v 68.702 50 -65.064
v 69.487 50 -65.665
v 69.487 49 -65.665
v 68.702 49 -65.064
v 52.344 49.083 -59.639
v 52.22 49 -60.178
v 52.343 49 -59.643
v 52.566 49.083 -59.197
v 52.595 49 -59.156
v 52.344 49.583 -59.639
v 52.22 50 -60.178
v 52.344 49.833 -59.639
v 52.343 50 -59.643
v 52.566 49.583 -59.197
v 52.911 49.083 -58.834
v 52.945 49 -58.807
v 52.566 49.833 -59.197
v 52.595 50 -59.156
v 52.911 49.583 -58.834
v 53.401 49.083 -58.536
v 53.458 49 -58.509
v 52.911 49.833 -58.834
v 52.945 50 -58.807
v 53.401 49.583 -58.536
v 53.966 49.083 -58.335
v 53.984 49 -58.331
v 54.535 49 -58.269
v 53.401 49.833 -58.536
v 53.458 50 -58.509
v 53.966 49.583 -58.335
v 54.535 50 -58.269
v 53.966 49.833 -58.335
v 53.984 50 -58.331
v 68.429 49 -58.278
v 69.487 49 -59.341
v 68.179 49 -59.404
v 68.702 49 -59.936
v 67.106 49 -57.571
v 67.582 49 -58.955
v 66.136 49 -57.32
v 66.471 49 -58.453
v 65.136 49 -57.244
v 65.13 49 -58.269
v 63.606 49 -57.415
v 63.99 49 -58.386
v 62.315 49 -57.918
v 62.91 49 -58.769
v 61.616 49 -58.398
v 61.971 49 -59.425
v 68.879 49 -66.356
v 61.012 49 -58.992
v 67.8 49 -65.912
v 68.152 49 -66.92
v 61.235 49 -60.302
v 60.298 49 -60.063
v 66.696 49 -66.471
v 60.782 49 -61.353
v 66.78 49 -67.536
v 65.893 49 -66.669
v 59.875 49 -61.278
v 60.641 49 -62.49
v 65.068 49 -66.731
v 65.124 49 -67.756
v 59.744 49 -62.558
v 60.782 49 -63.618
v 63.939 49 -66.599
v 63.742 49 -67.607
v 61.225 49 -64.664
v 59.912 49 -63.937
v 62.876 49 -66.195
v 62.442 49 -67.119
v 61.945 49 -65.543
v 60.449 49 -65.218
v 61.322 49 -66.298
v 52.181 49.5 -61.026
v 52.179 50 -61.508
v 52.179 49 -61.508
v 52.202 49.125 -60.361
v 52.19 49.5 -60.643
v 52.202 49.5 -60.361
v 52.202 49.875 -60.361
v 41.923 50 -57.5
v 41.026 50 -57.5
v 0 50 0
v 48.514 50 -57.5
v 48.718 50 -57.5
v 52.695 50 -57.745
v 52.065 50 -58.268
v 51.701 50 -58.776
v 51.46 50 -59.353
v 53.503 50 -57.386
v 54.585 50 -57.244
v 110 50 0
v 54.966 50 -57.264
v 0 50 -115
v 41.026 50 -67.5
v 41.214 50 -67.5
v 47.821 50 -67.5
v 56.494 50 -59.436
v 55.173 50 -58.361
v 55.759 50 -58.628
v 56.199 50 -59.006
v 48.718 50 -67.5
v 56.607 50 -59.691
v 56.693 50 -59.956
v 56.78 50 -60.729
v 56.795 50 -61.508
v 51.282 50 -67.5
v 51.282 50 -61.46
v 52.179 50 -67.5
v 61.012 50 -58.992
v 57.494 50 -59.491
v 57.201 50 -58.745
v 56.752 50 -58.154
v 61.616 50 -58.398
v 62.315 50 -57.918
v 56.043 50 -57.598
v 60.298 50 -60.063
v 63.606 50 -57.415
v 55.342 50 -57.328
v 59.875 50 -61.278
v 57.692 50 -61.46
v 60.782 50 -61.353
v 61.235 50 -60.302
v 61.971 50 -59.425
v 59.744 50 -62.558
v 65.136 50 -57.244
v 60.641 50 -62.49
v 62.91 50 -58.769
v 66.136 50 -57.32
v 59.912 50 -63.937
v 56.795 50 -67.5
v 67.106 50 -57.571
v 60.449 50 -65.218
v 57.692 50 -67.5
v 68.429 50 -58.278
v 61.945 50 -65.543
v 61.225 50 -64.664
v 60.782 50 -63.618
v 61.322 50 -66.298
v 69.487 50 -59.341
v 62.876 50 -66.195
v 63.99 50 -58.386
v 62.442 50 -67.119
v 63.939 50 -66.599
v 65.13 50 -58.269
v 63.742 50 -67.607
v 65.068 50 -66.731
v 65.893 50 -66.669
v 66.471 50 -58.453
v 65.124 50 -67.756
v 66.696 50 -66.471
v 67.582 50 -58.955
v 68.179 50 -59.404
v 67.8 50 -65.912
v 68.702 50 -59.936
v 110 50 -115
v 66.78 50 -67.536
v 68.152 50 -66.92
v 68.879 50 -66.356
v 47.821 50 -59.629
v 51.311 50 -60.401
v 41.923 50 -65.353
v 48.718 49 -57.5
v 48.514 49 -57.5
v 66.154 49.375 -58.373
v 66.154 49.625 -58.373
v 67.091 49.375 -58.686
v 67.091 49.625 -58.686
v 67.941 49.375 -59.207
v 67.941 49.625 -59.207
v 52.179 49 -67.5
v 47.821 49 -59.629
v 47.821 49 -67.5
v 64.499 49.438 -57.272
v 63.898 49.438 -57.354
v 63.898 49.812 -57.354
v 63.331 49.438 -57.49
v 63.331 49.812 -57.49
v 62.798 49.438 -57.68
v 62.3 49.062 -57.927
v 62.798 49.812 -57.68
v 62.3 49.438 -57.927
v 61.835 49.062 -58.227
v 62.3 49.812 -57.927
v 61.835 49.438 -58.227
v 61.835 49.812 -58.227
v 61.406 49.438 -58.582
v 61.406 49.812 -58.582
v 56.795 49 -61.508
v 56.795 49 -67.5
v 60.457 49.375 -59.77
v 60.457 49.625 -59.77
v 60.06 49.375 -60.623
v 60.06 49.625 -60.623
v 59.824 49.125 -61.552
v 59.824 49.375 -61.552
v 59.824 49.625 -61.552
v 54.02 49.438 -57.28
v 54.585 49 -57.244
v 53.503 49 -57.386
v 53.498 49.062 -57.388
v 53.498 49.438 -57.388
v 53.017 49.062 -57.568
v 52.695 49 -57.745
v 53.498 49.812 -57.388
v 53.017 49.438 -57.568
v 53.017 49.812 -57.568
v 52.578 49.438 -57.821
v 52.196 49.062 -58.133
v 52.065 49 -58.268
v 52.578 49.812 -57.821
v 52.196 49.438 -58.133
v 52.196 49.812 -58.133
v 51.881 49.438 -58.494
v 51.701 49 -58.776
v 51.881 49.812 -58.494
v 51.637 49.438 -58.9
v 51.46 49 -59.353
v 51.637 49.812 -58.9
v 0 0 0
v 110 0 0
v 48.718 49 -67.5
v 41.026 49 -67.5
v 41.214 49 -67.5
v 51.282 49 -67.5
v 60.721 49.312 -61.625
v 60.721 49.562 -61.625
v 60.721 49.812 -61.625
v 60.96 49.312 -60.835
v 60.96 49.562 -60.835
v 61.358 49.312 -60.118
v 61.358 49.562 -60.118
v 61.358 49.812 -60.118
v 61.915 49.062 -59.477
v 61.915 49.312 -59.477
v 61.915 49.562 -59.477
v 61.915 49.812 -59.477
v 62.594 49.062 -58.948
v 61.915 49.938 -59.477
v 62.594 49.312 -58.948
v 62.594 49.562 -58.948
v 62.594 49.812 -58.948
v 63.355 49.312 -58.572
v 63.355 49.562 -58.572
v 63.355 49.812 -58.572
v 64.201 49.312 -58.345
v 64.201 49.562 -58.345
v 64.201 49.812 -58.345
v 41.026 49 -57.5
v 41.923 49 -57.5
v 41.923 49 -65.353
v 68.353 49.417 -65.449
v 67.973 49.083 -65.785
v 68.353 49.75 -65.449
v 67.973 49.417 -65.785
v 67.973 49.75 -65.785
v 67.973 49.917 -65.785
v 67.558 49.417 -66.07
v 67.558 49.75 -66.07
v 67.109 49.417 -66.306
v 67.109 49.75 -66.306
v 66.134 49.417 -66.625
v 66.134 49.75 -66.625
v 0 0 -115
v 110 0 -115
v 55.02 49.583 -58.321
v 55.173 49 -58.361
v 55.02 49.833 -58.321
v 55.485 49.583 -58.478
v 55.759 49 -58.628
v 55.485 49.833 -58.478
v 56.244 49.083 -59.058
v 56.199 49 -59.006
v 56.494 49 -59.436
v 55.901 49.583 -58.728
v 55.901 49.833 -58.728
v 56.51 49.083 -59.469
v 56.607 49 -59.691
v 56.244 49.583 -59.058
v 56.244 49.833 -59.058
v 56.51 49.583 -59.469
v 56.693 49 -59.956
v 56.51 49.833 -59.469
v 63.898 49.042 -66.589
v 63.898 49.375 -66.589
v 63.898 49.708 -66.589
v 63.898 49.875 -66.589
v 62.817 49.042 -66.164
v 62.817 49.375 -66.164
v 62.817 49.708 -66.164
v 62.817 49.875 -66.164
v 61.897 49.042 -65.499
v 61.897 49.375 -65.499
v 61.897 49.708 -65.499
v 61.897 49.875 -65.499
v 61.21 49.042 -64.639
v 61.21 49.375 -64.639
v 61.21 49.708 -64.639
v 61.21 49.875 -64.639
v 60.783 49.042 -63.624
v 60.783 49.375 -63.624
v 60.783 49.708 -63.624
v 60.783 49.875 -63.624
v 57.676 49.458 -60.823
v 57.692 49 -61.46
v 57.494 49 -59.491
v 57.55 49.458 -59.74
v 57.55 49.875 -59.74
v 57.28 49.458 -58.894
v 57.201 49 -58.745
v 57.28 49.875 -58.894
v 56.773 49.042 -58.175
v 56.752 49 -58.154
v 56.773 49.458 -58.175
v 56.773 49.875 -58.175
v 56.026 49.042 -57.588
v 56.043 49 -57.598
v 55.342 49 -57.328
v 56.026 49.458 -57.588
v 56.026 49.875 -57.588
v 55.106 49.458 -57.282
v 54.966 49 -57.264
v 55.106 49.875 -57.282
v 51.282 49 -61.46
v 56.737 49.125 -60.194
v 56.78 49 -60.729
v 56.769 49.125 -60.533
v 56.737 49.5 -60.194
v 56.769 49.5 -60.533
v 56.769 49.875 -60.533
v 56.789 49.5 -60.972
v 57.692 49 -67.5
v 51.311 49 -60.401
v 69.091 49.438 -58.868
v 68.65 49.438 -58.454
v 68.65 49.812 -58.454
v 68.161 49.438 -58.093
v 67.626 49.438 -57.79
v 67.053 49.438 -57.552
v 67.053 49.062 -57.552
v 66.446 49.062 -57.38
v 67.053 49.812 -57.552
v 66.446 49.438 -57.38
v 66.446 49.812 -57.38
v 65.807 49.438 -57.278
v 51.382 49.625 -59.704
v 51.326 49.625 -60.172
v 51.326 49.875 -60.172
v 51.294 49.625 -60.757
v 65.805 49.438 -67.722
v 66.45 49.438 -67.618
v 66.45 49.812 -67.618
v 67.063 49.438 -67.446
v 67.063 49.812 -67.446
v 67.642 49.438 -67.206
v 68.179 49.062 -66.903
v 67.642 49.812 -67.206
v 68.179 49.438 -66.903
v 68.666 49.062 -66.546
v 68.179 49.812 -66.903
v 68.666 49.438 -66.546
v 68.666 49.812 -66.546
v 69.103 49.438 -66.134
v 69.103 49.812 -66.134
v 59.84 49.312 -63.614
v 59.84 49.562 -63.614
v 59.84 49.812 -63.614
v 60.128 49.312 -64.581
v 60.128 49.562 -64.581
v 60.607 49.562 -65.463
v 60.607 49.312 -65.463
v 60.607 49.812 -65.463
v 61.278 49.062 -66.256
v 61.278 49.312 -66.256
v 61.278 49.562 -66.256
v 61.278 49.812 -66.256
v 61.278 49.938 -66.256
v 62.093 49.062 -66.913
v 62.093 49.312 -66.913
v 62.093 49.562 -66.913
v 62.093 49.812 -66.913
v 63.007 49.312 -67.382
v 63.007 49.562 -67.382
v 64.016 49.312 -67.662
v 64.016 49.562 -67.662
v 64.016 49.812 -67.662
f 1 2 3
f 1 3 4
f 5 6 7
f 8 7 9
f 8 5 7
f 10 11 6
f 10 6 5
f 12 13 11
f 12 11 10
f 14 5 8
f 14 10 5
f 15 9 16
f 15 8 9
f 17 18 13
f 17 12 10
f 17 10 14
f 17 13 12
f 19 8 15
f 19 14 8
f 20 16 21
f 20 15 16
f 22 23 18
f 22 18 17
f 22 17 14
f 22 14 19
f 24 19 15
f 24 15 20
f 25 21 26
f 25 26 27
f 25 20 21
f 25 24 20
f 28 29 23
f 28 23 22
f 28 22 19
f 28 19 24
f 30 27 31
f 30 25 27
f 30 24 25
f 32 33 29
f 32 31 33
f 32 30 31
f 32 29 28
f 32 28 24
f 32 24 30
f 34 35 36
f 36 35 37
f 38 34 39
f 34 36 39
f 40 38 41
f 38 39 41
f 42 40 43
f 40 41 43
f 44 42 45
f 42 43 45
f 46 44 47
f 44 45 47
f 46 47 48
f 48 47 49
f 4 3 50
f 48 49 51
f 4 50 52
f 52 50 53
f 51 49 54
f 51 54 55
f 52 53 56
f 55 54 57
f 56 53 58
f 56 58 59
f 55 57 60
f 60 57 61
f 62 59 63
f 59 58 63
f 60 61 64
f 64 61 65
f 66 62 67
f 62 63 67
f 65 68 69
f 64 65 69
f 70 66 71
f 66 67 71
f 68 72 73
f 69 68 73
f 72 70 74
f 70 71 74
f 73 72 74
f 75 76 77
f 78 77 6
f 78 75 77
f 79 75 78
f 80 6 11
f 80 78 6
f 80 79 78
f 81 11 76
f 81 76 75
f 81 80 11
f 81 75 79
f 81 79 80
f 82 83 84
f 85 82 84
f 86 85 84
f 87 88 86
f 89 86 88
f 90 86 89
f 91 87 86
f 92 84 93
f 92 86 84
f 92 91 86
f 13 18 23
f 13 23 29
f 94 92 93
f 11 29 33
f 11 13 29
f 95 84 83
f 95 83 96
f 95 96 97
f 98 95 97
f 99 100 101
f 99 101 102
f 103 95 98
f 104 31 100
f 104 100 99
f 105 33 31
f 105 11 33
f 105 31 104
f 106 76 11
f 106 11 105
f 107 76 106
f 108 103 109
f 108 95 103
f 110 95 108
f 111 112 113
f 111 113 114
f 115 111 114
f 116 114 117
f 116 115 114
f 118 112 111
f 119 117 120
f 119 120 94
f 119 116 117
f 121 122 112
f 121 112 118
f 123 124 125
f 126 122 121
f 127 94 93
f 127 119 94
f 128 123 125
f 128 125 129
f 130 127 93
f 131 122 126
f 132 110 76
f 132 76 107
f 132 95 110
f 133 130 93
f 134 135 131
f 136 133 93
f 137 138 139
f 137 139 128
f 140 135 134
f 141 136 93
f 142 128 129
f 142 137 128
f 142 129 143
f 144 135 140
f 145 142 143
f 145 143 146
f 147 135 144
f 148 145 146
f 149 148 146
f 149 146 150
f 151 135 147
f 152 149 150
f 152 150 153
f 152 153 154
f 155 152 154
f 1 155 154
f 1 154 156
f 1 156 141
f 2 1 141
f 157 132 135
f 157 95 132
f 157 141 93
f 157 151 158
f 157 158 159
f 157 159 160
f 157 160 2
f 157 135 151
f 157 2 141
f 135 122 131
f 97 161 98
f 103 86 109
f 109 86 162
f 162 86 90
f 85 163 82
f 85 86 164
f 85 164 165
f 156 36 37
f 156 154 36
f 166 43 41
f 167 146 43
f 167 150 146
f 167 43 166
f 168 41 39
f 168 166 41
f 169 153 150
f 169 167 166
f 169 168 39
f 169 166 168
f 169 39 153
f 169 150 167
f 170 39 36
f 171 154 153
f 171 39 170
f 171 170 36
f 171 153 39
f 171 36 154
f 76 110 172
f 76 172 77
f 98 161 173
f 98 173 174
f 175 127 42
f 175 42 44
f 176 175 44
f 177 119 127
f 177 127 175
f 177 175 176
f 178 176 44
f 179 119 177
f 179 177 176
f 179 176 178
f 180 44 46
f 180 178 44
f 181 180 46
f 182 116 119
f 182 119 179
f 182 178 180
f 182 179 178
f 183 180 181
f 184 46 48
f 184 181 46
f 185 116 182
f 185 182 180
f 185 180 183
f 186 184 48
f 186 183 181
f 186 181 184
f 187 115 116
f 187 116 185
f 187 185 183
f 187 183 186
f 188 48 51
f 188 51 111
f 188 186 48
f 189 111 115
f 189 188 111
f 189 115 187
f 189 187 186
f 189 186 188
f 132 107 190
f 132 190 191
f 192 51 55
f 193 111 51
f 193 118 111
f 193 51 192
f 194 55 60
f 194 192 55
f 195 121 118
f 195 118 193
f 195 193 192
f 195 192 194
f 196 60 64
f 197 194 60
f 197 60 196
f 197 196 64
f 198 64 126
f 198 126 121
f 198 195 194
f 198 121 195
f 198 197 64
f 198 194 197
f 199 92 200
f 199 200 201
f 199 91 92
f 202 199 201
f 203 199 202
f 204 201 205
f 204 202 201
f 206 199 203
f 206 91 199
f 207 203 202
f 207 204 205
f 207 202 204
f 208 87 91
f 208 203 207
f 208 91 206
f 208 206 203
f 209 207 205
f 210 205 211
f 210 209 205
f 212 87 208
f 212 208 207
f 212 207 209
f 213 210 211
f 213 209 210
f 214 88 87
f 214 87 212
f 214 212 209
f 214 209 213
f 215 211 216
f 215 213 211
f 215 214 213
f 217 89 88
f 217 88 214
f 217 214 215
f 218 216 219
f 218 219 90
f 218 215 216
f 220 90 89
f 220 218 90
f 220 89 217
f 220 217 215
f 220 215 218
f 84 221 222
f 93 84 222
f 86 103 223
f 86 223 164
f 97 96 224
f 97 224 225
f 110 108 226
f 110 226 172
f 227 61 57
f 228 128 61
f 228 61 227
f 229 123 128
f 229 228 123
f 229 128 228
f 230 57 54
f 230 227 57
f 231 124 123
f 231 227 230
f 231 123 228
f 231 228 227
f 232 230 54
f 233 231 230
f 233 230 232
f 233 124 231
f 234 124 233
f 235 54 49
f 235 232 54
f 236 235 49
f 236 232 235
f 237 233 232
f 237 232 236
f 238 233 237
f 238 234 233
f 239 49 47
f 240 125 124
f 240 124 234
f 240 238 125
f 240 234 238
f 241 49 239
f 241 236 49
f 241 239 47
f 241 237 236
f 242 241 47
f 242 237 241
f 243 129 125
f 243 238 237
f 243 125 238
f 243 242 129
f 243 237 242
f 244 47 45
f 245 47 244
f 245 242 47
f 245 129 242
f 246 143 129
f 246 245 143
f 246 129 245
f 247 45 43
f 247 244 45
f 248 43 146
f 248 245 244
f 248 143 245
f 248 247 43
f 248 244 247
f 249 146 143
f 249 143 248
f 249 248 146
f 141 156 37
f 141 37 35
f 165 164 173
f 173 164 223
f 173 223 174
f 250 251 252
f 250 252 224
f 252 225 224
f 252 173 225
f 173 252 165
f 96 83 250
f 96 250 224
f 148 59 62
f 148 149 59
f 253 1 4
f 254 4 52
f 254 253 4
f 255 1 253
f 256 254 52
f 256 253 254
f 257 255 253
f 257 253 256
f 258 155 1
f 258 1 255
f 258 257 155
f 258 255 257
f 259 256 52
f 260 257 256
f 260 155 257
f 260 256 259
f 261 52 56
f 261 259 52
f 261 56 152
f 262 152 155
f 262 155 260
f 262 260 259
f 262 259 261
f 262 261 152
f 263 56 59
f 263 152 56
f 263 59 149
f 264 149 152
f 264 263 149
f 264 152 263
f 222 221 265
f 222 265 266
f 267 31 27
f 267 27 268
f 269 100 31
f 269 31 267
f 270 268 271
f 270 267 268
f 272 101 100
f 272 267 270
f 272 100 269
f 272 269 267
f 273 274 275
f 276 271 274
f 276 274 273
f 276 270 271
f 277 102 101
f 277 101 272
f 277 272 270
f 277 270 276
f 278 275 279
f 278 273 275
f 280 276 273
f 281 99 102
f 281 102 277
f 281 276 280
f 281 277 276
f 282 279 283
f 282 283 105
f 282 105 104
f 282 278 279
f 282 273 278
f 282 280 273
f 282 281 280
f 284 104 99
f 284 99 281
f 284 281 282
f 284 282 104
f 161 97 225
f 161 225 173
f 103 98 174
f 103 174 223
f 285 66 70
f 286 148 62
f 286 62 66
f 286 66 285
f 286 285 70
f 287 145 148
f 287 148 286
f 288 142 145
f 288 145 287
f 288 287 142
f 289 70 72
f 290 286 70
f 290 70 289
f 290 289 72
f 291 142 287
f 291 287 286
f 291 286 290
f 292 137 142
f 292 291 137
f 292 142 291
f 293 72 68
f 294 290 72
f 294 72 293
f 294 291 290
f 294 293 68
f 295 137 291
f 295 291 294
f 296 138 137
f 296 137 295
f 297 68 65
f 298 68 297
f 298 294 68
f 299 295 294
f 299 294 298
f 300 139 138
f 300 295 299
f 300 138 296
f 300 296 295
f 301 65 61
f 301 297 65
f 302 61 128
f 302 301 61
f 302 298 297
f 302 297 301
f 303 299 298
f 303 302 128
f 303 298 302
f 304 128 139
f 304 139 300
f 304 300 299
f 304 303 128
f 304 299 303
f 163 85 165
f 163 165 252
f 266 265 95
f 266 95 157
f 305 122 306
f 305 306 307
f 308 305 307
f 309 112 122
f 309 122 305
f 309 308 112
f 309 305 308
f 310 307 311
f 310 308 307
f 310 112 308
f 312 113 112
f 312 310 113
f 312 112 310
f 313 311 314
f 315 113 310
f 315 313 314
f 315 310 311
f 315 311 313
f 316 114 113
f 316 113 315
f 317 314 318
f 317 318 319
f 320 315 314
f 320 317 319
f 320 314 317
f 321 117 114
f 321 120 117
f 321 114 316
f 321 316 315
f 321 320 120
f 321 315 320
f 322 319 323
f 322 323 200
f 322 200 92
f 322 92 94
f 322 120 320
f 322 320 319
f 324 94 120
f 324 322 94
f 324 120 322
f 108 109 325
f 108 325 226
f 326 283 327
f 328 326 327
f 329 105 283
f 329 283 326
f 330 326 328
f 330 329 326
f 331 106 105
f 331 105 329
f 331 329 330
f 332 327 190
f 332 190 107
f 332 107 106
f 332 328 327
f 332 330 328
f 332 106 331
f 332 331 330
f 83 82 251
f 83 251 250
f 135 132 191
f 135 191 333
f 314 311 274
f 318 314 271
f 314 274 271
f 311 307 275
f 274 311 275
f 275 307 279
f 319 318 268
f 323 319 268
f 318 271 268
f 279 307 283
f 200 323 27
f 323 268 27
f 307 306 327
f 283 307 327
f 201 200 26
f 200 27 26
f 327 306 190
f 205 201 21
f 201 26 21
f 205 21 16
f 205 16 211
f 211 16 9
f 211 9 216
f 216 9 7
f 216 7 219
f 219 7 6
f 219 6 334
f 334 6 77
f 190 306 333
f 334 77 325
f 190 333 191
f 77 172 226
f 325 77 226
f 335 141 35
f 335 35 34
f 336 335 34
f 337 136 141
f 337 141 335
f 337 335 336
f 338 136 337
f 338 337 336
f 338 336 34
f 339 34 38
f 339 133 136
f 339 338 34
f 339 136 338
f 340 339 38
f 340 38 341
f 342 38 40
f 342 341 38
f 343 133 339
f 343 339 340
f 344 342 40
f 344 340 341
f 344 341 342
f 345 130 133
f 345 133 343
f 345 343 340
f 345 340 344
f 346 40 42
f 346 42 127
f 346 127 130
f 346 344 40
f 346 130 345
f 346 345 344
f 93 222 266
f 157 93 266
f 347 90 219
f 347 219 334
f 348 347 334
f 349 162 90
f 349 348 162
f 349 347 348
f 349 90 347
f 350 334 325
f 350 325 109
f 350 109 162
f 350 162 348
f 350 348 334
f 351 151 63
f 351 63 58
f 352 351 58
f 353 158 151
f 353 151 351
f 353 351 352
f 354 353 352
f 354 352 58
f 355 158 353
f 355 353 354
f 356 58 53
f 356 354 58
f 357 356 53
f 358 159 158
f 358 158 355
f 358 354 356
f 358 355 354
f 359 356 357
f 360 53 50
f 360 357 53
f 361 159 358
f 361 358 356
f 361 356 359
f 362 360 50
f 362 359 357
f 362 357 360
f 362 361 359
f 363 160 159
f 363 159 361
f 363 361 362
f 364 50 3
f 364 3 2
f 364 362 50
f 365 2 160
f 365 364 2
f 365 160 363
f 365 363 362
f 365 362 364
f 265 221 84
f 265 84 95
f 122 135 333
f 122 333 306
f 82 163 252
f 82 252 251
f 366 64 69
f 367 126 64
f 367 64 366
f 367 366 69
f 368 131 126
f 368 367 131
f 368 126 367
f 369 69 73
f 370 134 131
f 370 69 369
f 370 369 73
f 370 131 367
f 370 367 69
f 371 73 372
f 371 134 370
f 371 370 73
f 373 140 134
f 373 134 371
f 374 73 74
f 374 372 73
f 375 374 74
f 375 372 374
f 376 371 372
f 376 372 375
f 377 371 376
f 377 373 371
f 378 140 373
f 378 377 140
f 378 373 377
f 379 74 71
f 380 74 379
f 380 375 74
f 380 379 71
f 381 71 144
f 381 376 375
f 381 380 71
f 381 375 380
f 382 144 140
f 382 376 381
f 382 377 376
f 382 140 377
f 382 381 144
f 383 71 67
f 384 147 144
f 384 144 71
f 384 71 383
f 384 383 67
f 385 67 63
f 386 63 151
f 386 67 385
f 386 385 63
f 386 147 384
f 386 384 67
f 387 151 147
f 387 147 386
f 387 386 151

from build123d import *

# Parameters (mm, degrees)
SKETCH1_W           = 110
SKETCH1_H           = 115
BOSS_EXTRUDE1_DEPTH = 50
CUT_EXTRUDE1_DEPTH  = 1


with BuildPart() as part:
    # Sketch1 → Boss-Extrude1 (new body)
    with BuildSketch(Plane(origin=(0, 0, 0), x_dir=(1, 0, 0), z_dir=(0, 1, 0))):
        with Locations((55, 57.5)):
            Rectangle(SKETCH1_W, SKETCH1_H)
    extrude(amount=BOSS_EXTRUDE1_DEPTH)

    # Sketch2 → Cut-Extrude1 (cut)
    with BuildSketch(Plane(origin=(0, 50, 0), x_dir=(1, 0, 0), z_dir=(0, 1, 0))):
        Polygon((41.025641026, 57.5), (41.025641026, 67.5), (41.213942308, 67.5), (47.820512821, 59.629407051), (47.820512821, 67.5), (48.717948718, 67.5), (48.717948718, 57.5), (48.513621795, 57.5), (41.923076923, 65.352564103), (41.923076923, 57.5), align=None)
        with BuildLine():
            Line((51.282051282, 67.5), (52.179487179, 67.5))
            Line((52.179487179, 67.5), (52.179487179, 61.508413462))
            add(Edge.make_bspline(
                [(52.179487179, 61.508413462), (52.179353625, 61.423611359), (52.179100183, 61.262684757), (52.18079308, 61.033632469), (52.185534133, 60.829996872), (52.18852316, 60.650993022), (52.195172684, 60.497442315), (52.200595675, 60.368512856), (52.207568695, 60.264815135), (52.21594903, 60.204298203), (52.219551282, 60.178285256)],
                knots=[0, 0, 0, 0, 1.528628734, 2.90083645, 4.128790002, 5.200304208, 6.127813768, 6.898992206, 7.526736466, 8, 8, 8, 8], degree=3))
            add(Edge.make_bspline(
                [(52.219551282, 60.178285256), (52.234344021, 60.084437361), (52.263095982, 59.902029564), (52.336371348, 59.642291615), (52.438707065, 59.408201735), (52.559972901, 59.192455189), (52.719780362, 59.001057017), (52.911219034, 58.824738009), (53.143155516, 58.670532853), (53.401042961, 58.529530533), (53.679000782, 58.416201727), (53.963032972, 58.3305064), (54.248870055, 58.278280972), (54.440230527, 58.272233718), (54.53525641, 58.269230769)],
                knots=[0, 0, 0, 0, 1.035780045, 2.013197591, 2.933192213, 3.817615948, 4.702609284, 5.640816605, 6.646850145, 7.73207398, 8.84249596, 9.914020372, 10.964143139, 12, 12, 12, 12], degree=3))
            add(Edge.make_bspline(
                [(54.53525641, 58.269230769), (54.616838526, 58.272298913), (54.77953156, 58.278417479), (55.021264219, 58.316307282), (55.256693101, 58.384594613), (55.486980758, 58.472708208), (55.702840713, 58.589129897), (55.904393404, 58.72361801), (56.084290359, 58.88136337), (56.248456067, 59.055935783), (56.391413027, 59.25290664), (56.515330574, 59.467987034), (56.616833231, 59.70441374), (56.666957587, 59.870569232), (56.692708333, 59.955929487)],
                knots=[0, 0, 0, 0, 0.994687771, 1.983630487, 2.973142513, 3.978332533, 4.983357753, 5.956394766, 6.925816176, 7.893390482, 8.871859704, 9.88551698, 10.913711441, 12, 12, 12, 12], degree=3))
            add(Edge.make_bspline(
                [(56.692708333, 59.955929487), (56.70128012, 59.991211128), (56.720381515, 60.069832843), (56.738230215, 60.202750816), (56.756820287, 60.35957757), (56.769719059, 60.541439892), (56.782293974, 60.747728385), (56.789817039, 60.979517692), (56.793294276, 61.235966152), (56.794330506, 61.414929471), (56.794871795, 61.508413462)],
                knots=[0, 0, 0, 0, 0.558680831, 1.244966039, 2.062412453, 2.990489873, 4.051219941, 5.244515665, 6.560634259, 8, 8, 8, 8], degree=3))
            Line((56.794871795, 61.508413462), (56.794871795, 67.5))
            Line((56.794871795, 67.5), (57.692307692, 67.5))
            Line((57.692307692, 67.5), (57.692307692, 61.460336538))
            add(Edge.make_bspline(
                [(57.692307692, 61.460336538), (57.691581634, 61.351484027), (57.690164687, 61.139051733), (57.677877326, 60.827762136), (57.658285898, 60.532467904), (57.630605646, 60.253129342), (57.593928494, 59.99074603), (57.55314215, 59.743018121), (57.501200627, 59.511723856), (57.440533767, 59.295059806), (57.371180772, 59.088815482), (57.28134892, 58.893076583), (57.180136063, 58.701892584), (57.060094197, 58.51815513), (56.925204533, 58.341050692), (56.772485445, 58.171653335), (56.606987842, 58.00725606), (56.425960529, 57.852075871), (56.2323876, 57.709765366), (56.026844864, 57.584628877), (55.810911236, 57.478847113), (55.585148018, 57.391773043), (55.349458867, 57.32630276), (55.103837839, 57.2775166), (54.847725859, 57.24979575), (54.673541127, 57.24567595), (54.585336538, 57.243589744)],
                knots=[0, 0, 0, 0, 1.316592851, 2.569410997, 3.76748051, 4.895814652, 5.963796859, 6.97159953, 7.931736103, 8.829262218, 9.692595152, 10.560224239, 11.431080259, 12.30701507, 13.211635791, 14.121146779, 15.063487852, 16.031507147, 17.00238618, 17.966455255, 18.938106653, 19.907068911, 20.888905087, 21.893141452, 22.933117798, 24, 24, 24, 24], degree=3))
            add(Edge.make_bspline(
                [(54.585336538, 57.243589744), (54.489139102, 57.24583193), (54.300400077, 57.250231092), (54.022291313, 57.275438949), (53.755679324, 57.322920076), (53.497748247, 57.383377058), (53.252009684, 57.466759165), (53.015171271, 57.564182378), (52.791289325, 57.683831694), (52.576731815, 57.816955674), (52.377232511, 57.966740354), (52.194097074, 58.129997994), (52.027023158, 58.304113358), (51.878826883, 58.490971546), (51.747052927, 58.68911928), (51.633538031, 58.899117108), (51.536071619, 59.120883726), (51.485767142, 59.275035727), (51.460336538, 59.352964744)],
                knots=[0, 0, 0, 0, 1.13879206, 2.234305948, 3.301075583, 4.341971843, 5.366689343, 6.369221514, 7.369726634, 8.367512178, 9.355451585, 10.318319045, 11.268648973, 12.207971039, 13.137398894, 14.081662264, 15.030215811, 16, 16, 16, 16], degree=3))
            add(Edge.make_bspline(
                [(51.460336538, 59.352964744), (51.445544658, 59.406200671), (51.41346074, 59.521670582), (51.379102746, 59.712774835), (51.350219656, 59.932817457), (51.323060918, 60.181813509), (51.307035324, 60.459955985), (51.292985499, 60.767124316), (51.281952303, 61.103689921), (51.282017367, 61.338131394), (51.282051282, 61.460336538)],
                knots=[0, 0, 0, 0, 0.625038921, 1.35572334, 2.194682327, 3.136881307, 4.189498639, 5.346923369, 6.617055217, 8, 8, 8, 8], degree=3))
            Line((51.282051282, 61.460336538), (51.282051282, 67.5))
        make_face()
        with BuildLine():
            Line((69.487179487, 65.665064103), (68.701923077, 65.064102564))
            add(Edge.make_bspline(
                [(68.701923077, 65.064102564), (68.645906253, 65.130862478), (68.534627834, 65.263482237), (68.355601541, 65.449709507), (68.169025418, 65.624181683), (67.974970786, 65.78772991), (67.76994473, 65.934634955), (67.558913877, 66.072552392), (67.338348034, 66.1961745), (67.033343077, 66.346068746), (66.634349225, 66.502486332), (66.132078256, 66.633638422), (65.607760832, 66.717127495), (65.250053405, 66.726169899), (65.068108974, 66.730769231)],
                knots=[0, 0, 0, 0, 0.757959112, 1.505699292, 2.245454638, 2.979532153, 3.711538275, 4.438200793, 5.171680507, 5.909471876, 7.393775596, 8.890124382, 10.418191784, 12, 12, 12, 12], degree=3))
            add(Edge.make_bspline(
                [(65.068108974, 66.730769231), (64.967870976, 66.729615052), (64.768325283, 66.727317407), (64.472186787, 66.697005621), (64.18157807, 66.654402163), (63.896688166, 66.591186954), (63.617879713, 66.511265185), (63.343329993, 66.415764003), (63.077013994, 66.297607317), (62.815247599, 66.167012289), (62.564449853, 66.019505304), (62.327149717, 65.858610013), (62.104212666, 65.68612688), (61.895462345, 65.501409433), (61.70068535, 65.305289546), (61.521293033, 65.095677142), (61.357906147, 64.87324236), (61.207286075, 64.640918339), (61.072392551, 64.399381791), (60.959450039, 64.147738733), (60.859435404, 63.890298438), (60.780294711, 63.624152265), (60.717653234, 63.351172934), (60.674431339, 63.070627825), (60.644464278, 62.783103026), (60.642178059, 62.588219276), (60.641025641, 62.489983974)],
                knots=[0, 0, 0, 0, 1.054917814, 2.100044995, 3.131103042, 4.146048494, 5.169673617, 6.183595914, 7.203665975, 8.234915748, 9.262203917, 10.264457458, 11.251630812, 12.227803204, 13.197192746, 14.159520551, 15.12972552, 16.100847026, 17.073214652, 18.039054194, 19.002613845, 19.979014051, 20.95965708, 21.949030935, 22.966165397, 24, 24, 24, 24], degree=3))
            add(Edge.make_bspline(
                [(60.641025641, 62.489983974), (60.644630838, 62.342180203), (60.651709165, 62.051987104), (60.714704405, 61.626928216), (60.810433237, 61.219726291), (60.953906314, 60.832926742), (61.130817887, 60.461760004), (61.354362492, 60.112506138), (61.613266884, 59.779887382), (61.911193797, 59.471764674), (62.238067557, 59.190296887), (62.588775876, 58.942438083), (62.962445269, 58.735824133), (63.354949927, 58.563892857), (63.769310252, 58.431730778), (64.204781116, 58.338690426), (64.660415389, 58.277998481), (64.971756531, 58.272187944), (65.130208333, 58.269230769)],
                knots=[0, 0, 0, 0, 1.029171465, 2.020641659, 2.987623507, 3.938342917, 4.889210282, 5.84687017, 6.821220943, 7.821438502, 8.827599549, 9.822697543, 10.807740252, 11.797342354, 12.80366471, 13.83203677, 14.896651826, 16, 16, 16, 16], degree=3))
            add(Edge.make_bspline(
                [(65.130208333, 58.269230769), (65.304787445, 58.274055854), (65.648400899, 58.283552776), (66.152309545, 58.364007773), (66.634697447, 58.494458967), (67.095590552, 58.677024459), (67.533689541, 58.914353853), (67.949679999, 59.202062075), (68.343913057, 59.542885882), (68.580973864, 59.803123392), (68.701923077, 59.935897436)],
                knots=[0, 0, 0, 0, 1.028121516, 2.023589091, 2.998037872, 3.967518031, 4.937445131, 5.927275754, 6.942489185, 8, 8, 8, 8], degree=3))
            Line((68.701923077, 59.935897436), (69.487179487, 59.340945513))
            add(Edge.make_bspline(
                [(69.487179487, 59.340945513), (69.423984888, 59.259407079), (69.297898387, 59.096720775), (69.093732624, 58.867373033), (68.878654631, 58.651647217), (68.651066889, 58.451282585), (68.413587484, 58.262269826), (68.161952306, 58.08997888), (67.899469356, 57.932004925), (67.627027988, 57.787356569), (67.344917665, 57.659021578), (67.053476423, 57.54915367), (66.753960493, 57.454511128), (66.446356183, 57.376648452), (66.130025449, 57.315873926), (65.806109809, 57.275246284), (65.473910165, 57.247412243), (65.249791819, 57.24487534), (65.136217949, 57.243589744)],
                knots=[0, 0, 0, 0, 0.986787822, 1.968848986, 2.935600012, 3.899624008, 4.868462664, 5.837806735, 6.815139263, 7.798259679, 8.787526145, 9.778297419, 10.776456485, 11.791383307, 12.812564526, 13.85620153, 14.913611965, 16, 16, 16, 16], degree=3))
            add(Edge.make_bspline(
                [(65.136217949, 57.243589744), (65.028664614, 57.244338294), (64.815991214, 57.245818459), (64.501994781, 57.26979608), (64.196310264, 57.302509614), (63.899811333, 57.351767132), (63.610879976, 57.409893817), (63.332135449, 57.487811693), (63.060834848, 57.575095027), (62.79806816, 57.677680703), (62.543611875, 57.793441225), (62.2982867, 57.92427425), (62.062205464, 58.069079578), (61.833047119, 58.224665322), (61.61419688, 58.396029041), (61.403758236, 58.580790854), (61.200551161, 58.778328028), (61.074829204, 58.920770466), (61.01161859, 58.992387821)],
                knots=[0, 0, 0, 0, 1.114604814, 2.203992996, 3.262667896, 4.300477797, 5.318619304, 6.316056647, 7.298880507, 8.271930387, 9.238335007, 10.195173496, 11.151986948, 12.108099108, 13.064862484, 14.031167946, 15.010108607, 16, 16, 16, 16], degree=3))
            add(Edge.make_bspline(
                [(61.01161859, 58.992387821), (60.910373894, 59.116791217), (60.709106817, 59.364096104), (60.451604864, 59.764913194), (60.231183278, 60.18339379), (60.052966362, 60.621736444), (59.913644267, 61.07895755), (59.817126567, 61.555287592), (59.754407697, 62.050281712), (59.747235443, 62.386958251), (59.743589744, 62.558092949)],
                knots=[0, 0, 0, 0, 0.994628077, 1.977248131, 2.950237994, 3.925870899, 4.908910175, 5.911660606, 6.938484602, 8, 8, 8, 8], degree=3))
            add(Edge.make_bspline(
                [(59.743589744, 62.558092949), (59.748033154, 62.737965673), (59.756775286, 63.091854029), (59.831048987, 63.611208181), (59.950531262, 64.108783607), (60.120236658, 64.583651448), (60.335394805, 65.038309392), (60.60118513, 65.469284263), (60.914519822, 65.879332262), (61.272941444, 66.262231551), (61.665990973, 66.612343987), (62.08690187, 66.920361712), (62.53485029, 67.176697472), (63.004901295, 67.390972222), (63.500574671, 67.555670688), (64.020812868, 67.670965507), (64.564638339, 67.742728697), (64.935673841, 67.751800719), (65.124198718, 67.756410256)],
                knots=[0, 0, 0, 0, 1.032925535, 2.032216505, 3.007276963, 3.968222605, 4.92396291, 5.891752235, 6.871517503, 7.883894988, 8.900124299, 9.891468569, 10.874487609, 11.85992873, 12.854644235, 13.869047385, 14.917252991, 16, 16, 16, 16], degree=3))
            add(Edge.make_bspline(
                [(65.124198718, 67.756410256), (65.239097209, 67.755032719), (65.466527201, 67.752306022), (65.802963351, 67.725717044), (66.130512857, 67.681392455), (66.449401377, 67.621060827), (66.76118028, 67.546182766), (67.063466683, 67.448639056), (67.35803436, 67.337106109), (67.643025526, 67.20865335), (67.917072812, 67.06446266), (68.180090865, 66.906132307), (68.429990461, 66.733858577), (68.668530028, 66.549106647), (68.891719203, 66.347967906), (69.105894856, 66.135974775), (69.30378365, 65.907020992), (69.425935636, 65.745864038), (69.487179487, 65.665064103)],
                knots=[0, 0, 0, 0, 1.096760587, 2.17092713, 3.219439832, 4.250915756, 5.268269357, 6.278326846, 7.281116186, 8.274029601, 9.260640565, 10.235837813, 11.203064059, 12.156899882, 13.114053108, 14.069676657, 15.032185724, 16, 16, 16, 16], degree=3))
        make_face()
    extrude(amount=-CUT_EXTRUDE1_DEPTH, mode=Mode.SUBTRACT)


solid = part.part
